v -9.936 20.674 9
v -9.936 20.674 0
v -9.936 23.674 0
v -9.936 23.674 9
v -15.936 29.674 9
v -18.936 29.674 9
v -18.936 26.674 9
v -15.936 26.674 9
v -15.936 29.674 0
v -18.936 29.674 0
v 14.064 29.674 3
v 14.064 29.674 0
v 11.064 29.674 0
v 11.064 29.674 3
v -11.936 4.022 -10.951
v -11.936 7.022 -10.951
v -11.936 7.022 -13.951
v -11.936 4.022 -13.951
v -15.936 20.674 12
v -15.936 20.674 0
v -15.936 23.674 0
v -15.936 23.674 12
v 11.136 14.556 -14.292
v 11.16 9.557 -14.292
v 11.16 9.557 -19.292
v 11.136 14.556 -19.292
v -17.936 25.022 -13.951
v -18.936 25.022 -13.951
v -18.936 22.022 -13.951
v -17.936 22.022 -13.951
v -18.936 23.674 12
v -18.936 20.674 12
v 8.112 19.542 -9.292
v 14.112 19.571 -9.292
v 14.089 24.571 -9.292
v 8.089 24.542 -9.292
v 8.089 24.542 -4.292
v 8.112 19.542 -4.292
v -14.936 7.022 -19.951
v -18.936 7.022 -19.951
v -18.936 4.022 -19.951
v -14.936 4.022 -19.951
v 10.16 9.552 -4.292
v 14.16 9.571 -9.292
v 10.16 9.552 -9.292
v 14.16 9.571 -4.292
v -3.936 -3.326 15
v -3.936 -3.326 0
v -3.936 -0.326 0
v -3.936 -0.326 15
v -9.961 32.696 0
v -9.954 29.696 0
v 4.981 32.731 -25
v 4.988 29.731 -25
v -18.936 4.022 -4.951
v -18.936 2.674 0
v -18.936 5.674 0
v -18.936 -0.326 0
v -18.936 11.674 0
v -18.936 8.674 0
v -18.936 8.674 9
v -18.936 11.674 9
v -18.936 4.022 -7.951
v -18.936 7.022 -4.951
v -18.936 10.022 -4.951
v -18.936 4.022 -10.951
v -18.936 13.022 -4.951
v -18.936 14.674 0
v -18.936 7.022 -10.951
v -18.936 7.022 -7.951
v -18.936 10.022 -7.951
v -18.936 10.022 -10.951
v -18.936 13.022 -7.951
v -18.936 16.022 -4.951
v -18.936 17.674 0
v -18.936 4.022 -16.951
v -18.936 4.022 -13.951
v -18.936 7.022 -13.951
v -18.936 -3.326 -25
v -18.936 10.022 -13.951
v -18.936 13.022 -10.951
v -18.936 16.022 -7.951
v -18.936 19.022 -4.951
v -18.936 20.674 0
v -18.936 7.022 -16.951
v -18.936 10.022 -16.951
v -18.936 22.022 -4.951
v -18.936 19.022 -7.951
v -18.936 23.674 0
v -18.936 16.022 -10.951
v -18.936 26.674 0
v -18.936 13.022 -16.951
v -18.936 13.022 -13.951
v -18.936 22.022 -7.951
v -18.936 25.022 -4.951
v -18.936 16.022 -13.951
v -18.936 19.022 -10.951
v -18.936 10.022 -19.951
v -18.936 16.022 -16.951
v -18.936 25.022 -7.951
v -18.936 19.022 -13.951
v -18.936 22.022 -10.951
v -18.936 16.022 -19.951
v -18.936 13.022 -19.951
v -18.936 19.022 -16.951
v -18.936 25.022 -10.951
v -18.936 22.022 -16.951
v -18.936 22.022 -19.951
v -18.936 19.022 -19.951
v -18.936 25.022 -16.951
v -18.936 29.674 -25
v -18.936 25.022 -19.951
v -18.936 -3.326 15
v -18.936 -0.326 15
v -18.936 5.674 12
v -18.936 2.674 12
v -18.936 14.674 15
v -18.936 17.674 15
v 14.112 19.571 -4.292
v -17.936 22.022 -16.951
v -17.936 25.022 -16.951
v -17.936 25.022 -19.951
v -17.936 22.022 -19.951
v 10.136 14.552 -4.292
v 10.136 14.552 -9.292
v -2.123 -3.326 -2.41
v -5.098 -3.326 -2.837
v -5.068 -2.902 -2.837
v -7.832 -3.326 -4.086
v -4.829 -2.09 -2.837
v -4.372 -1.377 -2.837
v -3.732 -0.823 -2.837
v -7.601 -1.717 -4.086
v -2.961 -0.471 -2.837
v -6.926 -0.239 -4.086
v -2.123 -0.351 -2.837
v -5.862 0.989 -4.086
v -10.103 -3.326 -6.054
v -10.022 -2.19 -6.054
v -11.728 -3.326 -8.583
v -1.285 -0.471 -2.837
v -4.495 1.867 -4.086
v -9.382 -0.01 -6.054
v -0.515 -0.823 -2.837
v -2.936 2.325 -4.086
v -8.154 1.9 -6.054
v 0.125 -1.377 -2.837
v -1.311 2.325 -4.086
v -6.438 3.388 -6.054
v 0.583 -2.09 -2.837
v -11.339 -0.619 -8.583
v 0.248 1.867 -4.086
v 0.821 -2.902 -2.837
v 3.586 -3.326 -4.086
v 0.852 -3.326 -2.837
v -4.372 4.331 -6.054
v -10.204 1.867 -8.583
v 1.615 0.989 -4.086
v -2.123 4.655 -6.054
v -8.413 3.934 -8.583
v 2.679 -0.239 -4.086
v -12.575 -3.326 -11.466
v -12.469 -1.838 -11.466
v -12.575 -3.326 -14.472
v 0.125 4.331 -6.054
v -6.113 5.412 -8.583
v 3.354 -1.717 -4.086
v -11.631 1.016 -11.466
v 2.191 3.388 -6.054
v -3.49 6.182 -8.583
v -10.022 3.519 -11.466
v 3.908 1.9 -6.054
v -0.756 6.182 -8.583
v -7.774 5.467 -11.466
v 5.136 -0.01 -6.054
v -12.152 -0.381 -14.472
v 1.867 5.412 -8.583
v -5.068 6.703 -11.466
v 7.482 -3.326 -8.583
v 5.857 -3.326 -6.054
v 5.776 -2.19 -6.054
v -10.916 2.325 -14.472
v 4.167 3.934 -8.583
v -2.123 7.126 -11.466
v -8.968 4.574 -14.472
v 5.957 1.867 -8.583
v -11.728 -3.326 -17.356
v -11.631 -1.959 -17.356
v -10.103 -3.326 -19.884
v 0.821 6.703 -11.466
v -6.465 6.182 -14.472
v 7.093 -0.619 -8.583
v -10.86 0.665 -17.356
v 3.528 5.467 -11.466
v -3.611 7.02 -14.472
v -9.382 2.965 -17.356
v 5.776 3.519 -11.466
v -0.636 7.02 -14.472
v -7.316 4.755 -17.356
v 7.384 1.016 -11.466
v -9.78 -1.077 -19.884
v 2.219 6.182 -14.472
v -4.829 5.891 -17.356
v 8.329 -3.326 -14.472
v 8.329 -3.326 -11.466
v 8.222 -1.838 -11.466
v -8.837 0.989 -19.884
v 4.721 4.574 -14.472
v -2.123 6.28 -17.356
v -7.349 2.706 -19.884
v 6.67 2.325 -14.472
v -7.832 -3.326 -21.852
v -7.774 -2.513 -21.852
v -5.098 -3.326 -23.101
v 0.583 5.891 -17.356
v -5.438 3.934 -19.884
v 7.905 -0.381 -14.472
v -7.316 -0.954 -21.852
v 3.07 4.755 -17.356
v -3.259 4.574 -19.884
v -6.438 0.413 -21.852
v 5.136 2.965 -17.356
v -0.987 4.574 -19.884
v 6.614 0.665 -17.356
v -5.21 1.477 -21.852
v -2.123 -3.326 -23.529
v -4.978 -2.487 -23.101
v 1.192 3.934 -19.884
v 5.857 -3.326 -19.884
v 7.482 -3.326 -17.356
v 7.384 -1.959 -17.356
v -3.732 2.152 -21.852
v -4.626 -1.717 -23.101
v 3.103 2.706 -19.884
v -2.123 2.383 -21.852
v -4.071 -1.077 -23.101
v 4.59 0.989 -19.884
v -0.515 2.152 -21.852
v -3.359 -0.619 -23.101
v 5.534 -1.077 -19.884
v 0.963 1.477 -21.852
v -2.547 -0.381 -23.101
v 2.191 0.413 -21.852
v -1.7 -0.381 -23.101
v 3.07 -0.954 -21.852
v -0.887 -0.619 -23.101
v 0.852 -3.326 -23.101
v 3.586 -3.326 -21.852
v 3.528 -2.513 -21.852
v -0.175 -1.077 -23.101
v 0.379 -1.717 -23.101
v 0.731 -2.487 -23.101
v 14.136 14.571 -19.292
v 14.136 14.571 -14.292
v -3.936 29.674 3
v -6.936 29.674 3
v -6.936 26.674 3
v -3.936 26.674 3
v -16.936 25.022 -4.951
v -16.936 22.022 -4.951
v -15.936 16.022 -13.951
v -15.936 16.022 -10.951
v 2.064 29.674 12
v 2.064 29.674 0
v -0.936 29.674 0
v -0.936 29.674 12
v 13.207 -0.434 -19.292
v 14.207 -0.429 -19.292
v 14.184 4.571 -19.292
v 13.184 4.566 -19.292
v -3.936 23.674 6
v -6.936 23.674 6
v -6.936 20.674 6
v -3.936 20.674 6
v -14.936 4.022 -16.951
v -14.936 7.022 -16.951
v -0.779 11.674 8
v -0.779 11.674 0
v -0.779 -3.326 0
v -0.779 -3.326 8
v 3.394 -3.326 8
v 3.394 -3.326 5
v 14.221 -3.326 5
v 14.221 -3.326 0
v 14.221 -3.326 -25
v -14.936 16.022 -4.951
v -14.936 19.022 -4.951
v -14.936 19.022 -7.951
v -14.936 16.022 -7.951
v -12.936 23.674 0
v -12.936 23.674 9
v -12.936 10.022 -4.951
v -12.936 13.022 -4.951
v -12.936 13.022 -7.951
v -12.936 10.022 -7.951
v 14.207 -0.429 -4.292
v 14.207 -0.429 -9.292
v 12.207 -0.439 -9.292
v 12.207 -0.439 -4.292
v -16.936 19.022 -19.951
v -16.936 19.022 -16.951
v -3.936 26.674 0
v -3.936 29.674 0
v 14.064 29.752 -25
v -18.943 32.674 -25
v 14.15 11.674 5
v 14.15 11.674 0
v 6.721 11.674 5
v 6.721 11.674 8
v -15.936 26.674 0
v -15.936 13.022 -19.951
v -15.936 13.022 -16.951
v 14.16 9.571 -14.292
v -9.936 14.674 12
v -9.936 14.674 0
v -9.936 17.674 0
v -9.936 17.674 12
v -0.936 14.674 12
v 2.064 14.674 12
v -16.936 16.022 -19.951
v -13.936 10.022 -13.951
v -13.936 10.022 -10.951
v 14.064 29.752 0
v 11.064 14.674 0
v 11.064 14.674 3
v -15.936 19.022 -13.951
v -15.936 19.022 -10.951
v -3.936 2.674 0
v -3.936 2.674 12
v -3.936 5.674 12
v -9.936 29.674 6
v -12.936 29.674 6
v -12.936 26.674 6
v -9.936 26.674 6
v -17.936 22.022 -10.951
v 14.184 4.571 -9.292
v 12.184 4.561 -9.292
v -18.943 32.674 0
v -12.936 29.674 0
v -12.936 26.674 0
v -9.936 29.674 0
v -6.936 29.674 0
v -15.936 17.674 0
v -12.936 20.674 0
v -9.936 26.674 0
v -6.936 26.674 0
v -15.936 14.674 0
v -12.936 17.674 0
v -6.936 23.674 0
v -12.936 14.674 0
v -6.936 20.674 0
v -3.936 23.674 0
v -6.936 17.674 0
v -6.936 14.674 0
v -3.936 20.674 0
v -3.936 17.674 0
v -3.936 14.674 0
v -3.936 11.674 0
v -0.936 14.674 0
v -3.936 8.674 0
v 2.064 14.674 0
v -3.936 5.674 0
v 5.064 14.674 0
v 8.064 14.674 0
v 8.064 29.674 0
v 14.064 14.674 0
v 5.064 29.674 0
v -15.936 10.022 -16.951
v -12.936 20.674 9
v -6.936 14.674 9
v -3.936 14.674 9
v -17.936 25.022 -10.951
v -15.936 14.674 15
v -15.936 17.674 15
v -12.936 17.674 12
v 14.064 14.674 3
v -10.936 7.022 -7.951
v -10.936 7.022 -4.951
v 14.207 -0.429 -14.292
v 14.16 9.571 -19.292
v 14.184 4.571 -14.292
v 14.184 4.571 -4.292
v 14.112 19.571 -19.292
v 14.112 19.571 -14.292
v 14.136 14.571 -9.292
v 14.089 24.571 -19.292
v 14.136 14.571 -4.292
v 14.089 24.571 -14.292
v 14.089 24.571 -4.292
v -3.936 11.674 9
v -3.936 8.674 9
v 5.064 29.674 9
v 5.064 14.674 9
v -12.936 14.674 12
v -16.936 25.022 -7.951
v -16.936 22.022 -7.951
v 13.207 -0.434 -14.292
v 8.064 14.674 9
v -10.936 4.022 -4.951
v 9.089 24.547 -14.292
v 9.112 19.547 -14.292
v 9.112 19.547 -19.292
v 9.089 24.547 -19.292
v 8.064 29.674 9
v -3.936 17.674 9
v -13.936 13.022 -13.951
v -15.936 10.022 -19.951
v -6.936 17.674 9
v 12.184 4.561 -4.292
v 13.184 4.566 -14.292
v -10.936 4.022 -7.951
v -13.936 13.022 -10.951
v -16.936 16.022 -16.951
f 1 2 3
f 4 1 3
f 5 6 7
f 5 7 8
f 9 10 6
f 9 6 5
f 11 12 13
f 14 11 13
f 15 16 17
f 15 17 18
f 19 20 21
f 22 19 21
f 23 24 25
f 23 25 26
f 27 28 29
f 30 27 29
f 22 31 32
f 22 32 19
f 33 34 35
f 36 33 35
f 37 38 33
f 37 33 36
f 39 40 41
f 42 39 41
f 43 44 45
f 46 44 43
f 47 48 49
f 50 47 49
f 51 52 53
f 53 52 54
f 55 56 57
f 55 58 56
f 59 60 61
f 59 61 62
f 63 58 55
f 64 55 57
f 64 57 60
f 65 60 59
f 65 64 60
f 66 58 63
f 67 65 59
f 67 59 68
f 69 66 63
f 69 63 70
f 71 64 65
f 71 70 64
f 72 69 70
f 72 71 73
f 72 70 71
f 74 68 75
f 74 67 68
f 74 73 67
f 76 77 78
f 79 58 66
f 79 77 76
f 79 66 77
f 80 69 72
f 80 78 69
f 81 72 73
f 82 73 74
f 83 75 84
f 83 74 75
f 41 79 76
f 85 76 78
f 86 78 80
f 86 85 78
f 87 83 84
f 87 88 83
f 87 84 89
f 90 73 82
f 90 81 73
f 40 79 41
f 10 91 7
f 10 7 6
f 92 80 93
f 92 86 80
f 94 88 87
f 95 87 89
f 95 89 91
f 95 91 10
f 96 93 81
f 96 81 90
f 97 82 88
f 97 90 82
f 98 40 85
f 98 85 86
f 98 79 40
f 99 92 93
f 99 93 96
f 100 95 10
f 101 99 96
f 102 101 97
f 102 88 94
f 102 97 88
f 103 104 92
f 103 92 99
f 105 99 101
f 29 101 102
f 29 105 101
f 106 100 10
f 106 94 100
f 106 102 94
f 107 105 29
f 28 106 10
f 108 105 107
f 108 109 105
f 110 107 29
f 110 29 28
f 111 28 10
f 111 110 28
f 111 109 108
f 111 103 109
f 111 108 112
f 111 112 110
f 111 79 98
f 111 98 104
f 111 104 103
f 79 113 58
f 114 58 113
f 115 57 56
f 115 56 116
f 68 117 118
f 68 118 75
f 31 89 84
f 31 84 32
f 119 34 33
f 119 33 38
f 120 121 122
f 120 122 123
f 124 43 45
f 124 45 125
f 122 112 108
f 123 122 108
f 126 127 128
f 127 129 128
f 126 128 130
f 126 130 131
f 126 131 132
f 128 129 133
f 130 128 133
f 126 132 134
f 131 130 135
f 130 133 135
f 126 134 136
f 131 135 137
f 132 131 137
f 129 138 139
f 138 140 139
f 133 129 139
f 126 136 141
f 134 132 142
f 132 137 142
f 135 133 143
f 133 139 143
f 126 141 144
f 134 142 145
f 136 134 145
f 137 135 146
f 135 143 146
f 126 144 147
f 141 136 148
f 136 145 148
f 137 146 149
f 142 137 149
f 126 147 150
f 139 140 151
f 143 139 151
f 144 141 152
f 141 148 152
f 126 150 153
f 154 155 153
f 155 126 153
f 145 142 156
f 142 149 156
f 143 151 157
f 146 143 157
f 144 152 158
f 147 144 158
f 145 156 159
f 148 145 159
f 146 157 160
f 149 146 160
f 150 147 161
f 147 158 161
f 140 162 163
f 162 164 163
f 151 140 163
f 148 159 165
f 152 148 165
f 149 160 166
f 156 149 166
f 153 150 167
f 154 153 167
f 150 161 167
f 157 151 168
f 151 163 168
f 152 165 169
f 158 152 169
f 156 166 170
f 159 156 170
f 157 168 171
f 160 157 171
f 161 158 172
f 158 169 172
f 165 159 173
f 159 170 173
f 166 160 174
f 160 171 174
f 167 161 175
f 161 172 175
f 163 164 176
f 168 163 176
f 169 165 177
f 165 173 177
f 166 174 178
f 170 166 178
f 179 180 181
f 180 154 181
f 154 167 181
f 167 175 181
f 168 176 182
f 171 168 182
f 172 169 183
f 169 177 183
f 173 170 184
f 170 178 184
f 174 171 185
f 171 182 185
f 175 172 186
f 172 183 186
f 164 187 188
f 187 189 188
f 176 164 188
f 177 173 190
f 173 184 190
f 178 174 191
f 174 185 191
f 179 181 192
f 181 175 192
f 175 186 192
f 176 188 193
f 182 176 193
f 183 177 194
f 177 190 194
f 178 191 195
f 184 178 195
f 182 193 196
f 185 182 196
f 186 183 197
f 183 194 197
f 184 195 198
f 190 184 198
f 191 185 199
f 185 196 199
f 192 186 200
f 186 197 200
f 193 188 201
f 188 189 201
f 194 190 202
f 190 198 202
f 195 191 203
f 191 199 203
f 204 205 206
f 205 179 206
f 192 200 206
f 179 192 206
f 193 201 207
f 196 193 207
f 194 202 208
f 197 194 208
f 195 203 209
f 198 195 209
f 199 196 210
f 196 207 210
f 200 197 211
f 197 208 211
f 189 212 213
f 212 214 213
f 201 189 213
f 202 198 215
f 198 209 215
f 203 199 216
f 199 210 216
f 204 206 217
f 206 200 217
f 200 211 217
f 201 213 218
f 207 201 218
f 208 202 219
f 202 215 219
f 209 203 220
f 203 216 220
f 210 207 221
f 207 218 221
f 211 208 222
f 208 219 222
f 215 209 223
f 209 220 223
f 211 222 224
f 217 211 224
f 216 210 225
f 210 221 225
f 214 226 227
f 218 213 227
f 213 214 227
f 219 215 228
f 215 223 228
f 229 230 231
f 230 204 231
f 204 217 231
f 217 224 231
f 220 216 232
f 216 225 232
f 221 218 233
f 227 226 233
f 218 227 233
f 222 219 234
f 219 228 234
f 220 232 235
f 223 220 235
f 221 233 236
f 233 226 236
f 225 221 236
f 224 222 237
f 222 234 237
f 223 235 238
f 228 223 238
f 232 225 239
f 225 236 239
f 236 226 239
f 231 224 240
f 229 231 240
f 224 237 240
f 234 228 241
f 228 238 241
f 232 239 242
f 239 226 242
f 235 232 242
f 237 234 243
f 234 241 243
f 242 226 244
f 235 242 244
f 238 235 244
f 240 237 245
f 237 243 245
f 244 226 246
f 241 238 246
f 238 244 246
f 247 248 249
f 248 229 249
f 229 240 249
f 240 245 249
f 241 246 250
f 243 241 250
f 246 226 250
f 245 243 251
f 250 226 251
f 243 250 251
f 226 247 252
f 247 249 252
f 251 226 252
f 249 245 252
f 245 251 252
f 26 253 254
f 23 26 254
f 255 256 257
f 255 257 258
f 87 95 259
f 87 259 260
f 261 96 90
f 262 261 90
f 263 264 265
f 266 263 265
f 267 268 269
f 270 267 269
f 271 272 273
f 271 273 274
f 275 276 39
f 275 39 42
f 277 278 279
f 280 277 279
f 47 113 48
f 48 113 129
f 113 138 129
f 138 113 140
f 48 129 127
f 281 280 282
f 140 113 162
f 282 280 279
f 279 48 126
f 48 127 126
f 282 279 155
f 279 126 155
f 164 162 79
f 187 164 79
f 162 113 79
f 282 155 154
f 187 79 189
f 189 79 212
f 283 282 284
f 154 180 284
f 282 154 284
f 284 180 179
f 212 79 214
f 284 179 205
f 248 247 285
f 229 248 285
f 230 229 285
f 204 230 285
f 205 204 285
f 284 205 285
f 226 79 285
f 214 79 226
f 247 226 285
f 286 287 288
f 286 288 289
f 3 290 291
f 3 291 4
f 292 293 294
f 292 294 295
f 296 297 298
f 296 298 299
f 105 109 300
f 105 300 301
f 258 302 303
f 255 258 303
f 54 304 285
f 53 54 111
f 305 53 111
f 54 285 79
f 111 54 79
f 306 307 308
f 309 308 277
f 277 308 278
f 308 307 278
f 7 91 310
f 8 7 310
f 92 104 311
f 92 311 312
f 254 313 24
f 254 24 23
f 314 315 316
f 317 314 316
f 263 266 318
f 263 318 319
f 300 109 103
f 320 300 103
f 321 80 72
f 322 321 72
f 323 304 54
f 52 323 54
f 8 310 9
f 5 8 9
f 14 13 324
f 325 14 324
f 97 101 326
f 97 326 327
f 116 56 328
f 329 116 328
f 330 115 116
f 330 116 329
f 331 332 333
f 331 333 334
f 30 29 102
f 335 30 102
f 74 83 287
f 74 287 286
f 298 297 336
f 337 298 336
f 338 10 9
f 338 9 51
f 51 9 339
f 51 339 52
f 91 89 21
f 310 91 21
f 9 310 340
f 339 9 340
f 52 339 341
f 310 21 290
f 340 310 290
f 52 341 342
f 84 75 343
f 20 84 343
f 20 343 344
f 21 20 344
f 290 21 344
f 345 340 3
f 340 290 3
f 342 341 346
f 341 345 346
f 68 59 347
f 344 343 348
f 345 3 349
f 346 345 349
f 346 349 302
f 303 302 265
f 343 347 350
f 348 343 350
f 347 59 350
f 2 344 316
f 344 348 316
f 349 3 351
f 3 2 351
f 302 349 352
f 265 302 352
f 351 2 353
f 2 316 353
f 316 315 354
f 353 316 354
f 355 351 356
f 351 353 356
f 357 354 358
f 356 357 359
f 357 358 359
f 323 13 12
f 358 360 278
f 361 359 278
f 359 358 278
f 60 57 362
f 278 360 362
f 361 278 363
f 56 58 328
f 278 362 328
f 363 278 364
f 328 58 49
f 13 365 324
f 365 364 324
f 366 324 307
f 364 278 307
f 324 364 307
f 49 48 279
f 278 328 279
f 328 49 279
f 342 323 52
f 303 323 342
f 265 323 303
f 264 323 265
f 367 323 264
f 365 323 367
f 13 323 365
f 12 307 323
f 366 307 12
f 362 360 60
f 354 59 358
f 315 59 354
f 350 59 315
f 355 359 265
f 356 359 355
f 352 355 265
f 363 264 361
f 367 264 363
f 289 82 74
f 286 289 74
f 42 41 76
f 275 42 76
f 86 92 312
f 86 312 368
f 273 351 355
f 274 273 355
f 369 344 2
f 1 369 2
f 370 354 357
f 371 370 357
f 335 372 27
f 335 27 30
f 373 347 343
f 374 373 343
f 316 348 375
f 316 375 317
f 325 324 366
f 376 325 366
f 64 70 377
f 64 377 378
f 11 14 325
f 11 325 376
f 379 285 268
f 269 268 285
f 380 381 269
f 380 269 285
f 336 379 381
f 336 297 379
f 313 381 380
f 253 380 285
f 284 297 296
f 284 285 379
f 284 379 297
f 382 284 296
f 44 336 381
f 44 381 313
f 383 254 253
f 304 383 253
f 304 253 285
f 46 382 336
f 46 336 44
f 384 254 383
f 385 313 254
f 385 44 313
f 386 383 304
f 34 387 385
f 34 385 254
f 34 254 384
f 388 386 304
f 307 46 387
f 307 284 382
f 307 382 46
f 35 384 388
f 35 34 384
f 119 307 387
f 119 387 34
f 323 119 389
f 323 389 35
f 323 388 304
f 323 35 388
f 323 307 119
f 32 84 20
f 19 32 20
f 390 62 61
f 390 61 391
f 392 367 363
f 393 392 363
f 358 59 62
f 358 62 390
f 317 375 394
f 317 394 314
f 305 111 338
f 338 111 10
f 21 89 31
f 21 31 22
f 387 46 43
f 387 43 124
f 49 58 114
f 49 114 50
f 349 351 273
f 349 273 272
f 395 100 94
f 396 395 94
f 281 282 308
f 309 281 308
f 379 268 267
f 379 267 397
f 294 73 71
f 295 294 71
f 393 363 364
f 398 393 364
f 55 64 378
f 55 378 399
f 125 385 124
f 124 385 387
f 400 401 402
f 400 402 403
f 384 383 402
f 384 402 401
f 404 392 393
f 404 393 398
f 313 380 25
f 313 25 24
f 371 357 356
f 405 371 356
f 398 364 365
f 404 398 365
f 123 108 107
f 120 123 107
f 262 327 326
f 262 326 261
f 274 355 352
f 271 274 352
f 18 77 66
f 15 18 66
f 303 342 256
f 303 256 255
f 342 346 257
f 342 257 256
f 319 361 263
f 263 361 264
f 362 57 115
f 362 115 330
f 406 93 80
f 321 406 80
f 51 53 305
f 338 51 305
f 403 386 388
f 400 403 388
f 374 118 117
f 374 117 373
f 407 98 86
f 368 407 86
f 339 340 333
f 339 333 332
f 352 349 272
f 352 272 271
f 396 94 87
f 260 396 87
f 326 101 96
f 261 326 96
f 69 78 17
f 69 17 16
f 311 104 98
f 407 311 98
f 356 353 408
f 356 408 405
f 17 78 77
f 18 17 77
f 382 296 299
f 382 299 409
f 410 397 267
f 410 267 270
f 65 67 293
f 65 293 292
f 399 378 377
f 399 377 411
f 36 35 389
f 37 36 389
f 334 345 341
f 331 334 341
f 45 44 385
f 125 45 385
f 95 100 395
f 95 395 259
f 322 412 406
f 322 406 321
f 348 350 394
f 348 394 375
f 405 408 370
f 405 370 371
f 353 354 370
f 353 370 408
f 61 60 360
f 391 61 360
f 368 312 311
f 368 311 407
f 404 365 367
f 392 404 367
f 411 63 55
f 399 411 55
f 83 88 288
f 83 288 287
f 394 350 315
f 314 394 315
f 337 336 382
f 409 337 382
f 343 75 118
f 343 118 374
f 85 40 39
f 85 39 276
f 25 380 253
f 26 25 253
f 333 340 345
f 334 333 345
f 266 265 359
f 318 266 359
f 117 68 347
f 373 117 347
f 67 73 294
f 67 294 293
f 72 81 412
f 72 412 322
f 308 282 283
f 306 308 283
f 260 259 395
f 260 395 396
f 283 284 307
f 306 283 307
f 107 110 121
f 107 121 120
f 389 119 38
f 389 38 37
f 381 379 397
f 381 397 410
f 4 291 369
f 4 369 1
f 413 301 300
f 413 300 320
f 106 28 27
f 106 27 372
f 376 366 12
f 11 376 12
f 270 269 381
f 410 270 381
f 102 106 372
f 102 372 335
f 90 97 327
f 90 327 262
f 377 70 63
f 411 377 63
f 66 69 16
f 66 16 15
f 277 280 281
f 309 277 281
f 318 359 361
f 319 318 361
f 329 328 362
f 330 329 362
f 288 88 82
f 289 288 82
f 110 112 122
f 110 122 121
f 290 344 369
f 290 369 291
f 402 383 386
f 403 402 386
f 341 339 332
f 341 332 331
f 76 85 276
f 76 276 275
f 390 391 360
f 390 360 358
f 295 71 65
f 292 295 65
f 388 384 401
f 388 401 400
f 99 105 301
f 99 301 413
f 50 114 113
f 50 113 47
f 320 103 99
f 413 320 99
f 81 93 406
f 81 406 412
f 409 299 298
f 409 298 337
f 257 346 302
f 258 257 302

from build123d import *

# Parameters (mm, degrees)
F1_DEPTH  = 5
F0_W      = 15
F0_H      = 3
F2_DEPTH  = 15
F0_W_2    = 3
F3_DEPTH  = 3
F4_DEPTH  = 12
F6_DEPTH  = 25
F10_W     = 5
F10_H     = 5
F11_DEPTH = 2
F12_DEPTH = 12
F13_DEPTH = 9
F14_DEPTH = 6
F15_DEPTH = 9
F16_DEPTH = 9
F17_DEPTH = 15
F18_DEPTH = 12
F19_DEPTH = 6
F20_DEPTH = 9
F21_DEPTH = 12
F22_DEPTH = 9
F23_DEPTH = 3
F24_DEPTH = 4
F25_DEPTH = 6
F26_DEPTH = 1
F27_DEPTH = 3
F28_DEPTH = 5
F9_W      = 3
F9_H      = 3
F29_DEPTH = 2
F30_DEPTH = 4
F31_DEPTH = 6
F32_DEPTH = 8
F33_DEPTH = 1
F34_DEPTH = 3
F35_DEPTH = 5
F36_DEPTH = 7
F37_DEPTH = 1
F38_DEPTH = 2
F39_DEPTH = 3
F40_DEPTH = 4
F42_DEPTH = 3
F44_DEPTH = 3


with BuildPart() as f1:
    # F0 (on Top) → F1 (new body)
    with BuildSketch(Plane.XY):
        Polygon((14.2212225916, -3.3255452978), (14.1498658388, 11.6744547022), (-0.7787774084, 11.6744547022), (-0.7787774084, -3.3255452978), align=None)
    extrude(amount=F1_DEPTH)



with BuildPart() as f2:
    # F0 (on Top) → F2 (new body)
    with BuildSketch(Plane.XY):
        with Locations((-11.4361313693, -1.8255452978)):
            Rectangle(F0_W, F0_H)
    extrude(amount=F2_DEPTH)


with BuildPart() as f3:
    # F0 (on Top) → F3 (new body)
    with BuildSketch(Plane.XY):
        with Locations((-5.4361313693, 28.1744547022)):
            Rectangle(F0_W_2, F0_H)
    extrude(amount=F3_DEPTH)


with BuildPart() as f4:
    # F0 (on Top) → F4 (new body)
    with BuildSketch(Plane.XY):
        Polygon((2.0638686307, 29.6744547022), (-0.9361313693, 29.6744547022), (-0.9361313693, 14.7520447022), (-0.9361313693, 14.6744547022), (2.0638686307, 14.6744547022), (2.0638686307, 14.7520447022), align=None)
    extrude(amount=F4_DEPTH)


with BuildPart() as f1_1:
    add(f1.part)

    add(f2.part)  # F6 merges F2

    add(f3.part)  # F6 merges F3

    add(f4.part)  # F6 merges F4
    # F5 (on Top) → F6 (join)
    with BuildSketch(Plane.XY):
        Polygon((-18.9361313693, -3.3255452978), (14.2212225916, -3.3255452978), (14.0638686307, 29.7520447022), (-18.9361313693, 29.6744547022), align=None)
    extrude(amount=-F6_DEPTH)

    # F7 (on face) → F8 (revolve, cut)
    with BuildSketch(Plane.XZ.offset(3.3255452978)):
        with BuildLine():
            Line((-2.1231973078, -23.52852803), (-2.1231973078, -2.4096941548))
            ThreePointArc((-2.1231973078, -2.4096941548), (-12.6826142454, -12.9691110924), (-2.1231973078, -23.52852803))
        make_face()
    revolve(axis=Axis((-2.1231973078, -3.3255452978, -12.9691110924), (0, 0, -1)), mode=Mode.SUBTRACT)

    # F10 (on face) → F11 (cut)
    with BuildSketch(Plane(origin=(14.2050811207, 0.0675752308, 0), x_dir=(-0.004757063, 0.9999886851, 0), z_dir=(0.9999886851, 0.004757063, 0))):
        with Locations((2.0033325977, -6.7919711024)):
            Rectangle(F10_W, F10_H)
    extrude(amount=-F11_DEPTH, mode=Mode.SUBTRACT)

    # F0 (on Top) → F12 (join)
    with BuildSketch(Plane.XY):
        with Locations((-11.4361313693, 4.1744547022)):
            Rectangle(F0_W, F0_H)
    extrude(amount=F12_DEPTH)

    # F0 (on Top) → F13 (join)
    with BuildSketch(Plane.XY):
        with Locations((-11.4361313693, 10.1744547022)):
            Rectangle(F0_W, F0_H)
    extrude(amount=F13_DEPTH)

    # F0 (on Top) → F14 (join)
    with BuildSketch(Plane.XY):
        with Locations((-11.4361313693, 28.1744547022)):
            Rectangle(F0_W_2, F0_H)
    extrude(amount=F14_DEPTH)

    # F0 (on Top) → F15 (join)
    with BuildSketch(Plane.XY):
        with Locations((-17.4361313693, 28.1744547022)):
            Rectangle(F0_W_2, F0_H)
    extrude(amount=F15_DEPTH)

    # F0 (on Top) → F16 (join)
    with BuildSketch(Plane.XY):
        with Locations((-11.4361313693, 22.1744547022)):
            Rectangle(F0_W_2, F0_H)
    extrude(amount=F16_DEPTH)

    # F0 (on Top) → F17 (join)
    with BuildSketch(Plane.XY):
        with Locations((-17.4361313693, 16.1744547022)):
            Rectangle(F0_W_2, F0_H)
    extrude(amount=F17_DEPTH)

    # F0 (on Top) → F18 (join)
    with BuildSketch(Plane.XY):
        with Locations((-17.4361313693, 22.1744547022)):
            Rectangle(F0_W_2, F0_H)
    extrude(amount=F18_DEPTH)

    # F0 (on Top) → F19 (join)
    with BuildSketch(Plane.XY):
        with Locations((-5.4361313693, 22.1744547022)):
            Rectangle(F0_W_2, F0_H)
    extrude(amount=F19_DEPTH)

    # F0 (on Top) → F20 (join)
    with BuildSketch(Plane.XY):
        with Locations((-5.4361313693, 16.1744547022)):
            Rectangle(F0_W_2, F0_H)
    extrude(amount=F20_DEPTH)

    # F0 (on Top) → F21 (join)
    with BuildSketch(Plane.XY):
        with Locations((-11.4361313693, 16.1744547022)):
            Rectangle(F0_W_2, F0_H)
    extrude(amount=F21_DEPTH)

    # F0 (on Top) → F22 (join)
    with BuildSketch(Plane.XY):
        Polygon((8.0638686307, 29.6744547022), (5.0638686307, 29.6744547022), (5.0638686307, 14.7520447022), (5.0638686307, 14.6744547022), (8.0638686307, 14.6744547022), (8.0638686307, 14.7520447022), align=None)
    extrude(amount=F22_DEPTH)

    # F0 (on Top) → F23 (join)
    with BuildSketch(Plane.XY):
        Polygon((14.0638686307, 29.6744547022), (11.0638686307, 29.6744547022), (11.0638686307, 14.7520447022), (11.0638686307, 14.6744547022), (14.0638686307, 14.6744547022), (14.0638686307, 14.7520447022), align=None)
    extrude(amount=F23_DEPTH)

    # F10 (on face) → F24 (cut)
    with BuildSketch(Plane(origin=(14.2050811207, 0.0675752308, 0), x_dir=(-0.004757063, 0.9999886851, 0), z_dir=(0.9999886851, 0.004757063, 0))):
        with Locations((12.0033325977, -6.7919711024)):
            Rectangle(F10_W, F10_H)
    extrude(amount=-F24_DEPTH, mode=Mode.SUBTRACT)

    # F10 (on face) → F25 (cut)
    with BuildSketch(Plane(origin=(14.2050811207, 0.0675752308, 0), x_dir=(-0.004757063, 0.9999886851, 0), z_dir=(0.9999886851, 0.004757063, 0))):
        with Locations((22.0033325977, -6.7919711024)):
            Rectangle(F10_W, F10_H)
    extrude(amount=-F25_DEPTH, mode=Mode.SUBTRACT)

    # F10 (on face) → F26 (cut)
    with BuildSketch(Plane(origin=(14.2050811207, 0.0675752308, 0), x_dir=(-0.004757063, 0.9999886851, 0), z_dir=(0.9999886851, 0.004757063, 0))):
        with Locations((2.0033325977, -16.7919711024)):
            Rectangle(F10_W, F10_H)
    extrude(amount=-F26_DEPTH, mode=Mode.SUBTRACT)

    # F10 (on face) → F27 (cut)
    with BuildSketch(Plane(origin=(14.2050811207, 0.0675752308, 0), x_dir=(-0.004757063, 0.9999886851, 0), z_dir=(0.9999886851, 0.004757063, 0))):
        with Locations((12.0033325977, -16.7919711024)):
            Rectangle(F10_W, F10_H)
    extrude(amount=-F27_DEPTH, mode=Mode.SUBTRACT)

    # F10 (on face) → F28 (cut)
    with BuildSketch(Plane(origin=(14.2050811207, 0.0675752308, 0), x_dir=(-0.004757063, 0.9999886851, 0), z_dir=(0.9999886851, 0.004757063, 0))):
        with Locations((22.0033325977, -16.7919711024)):
            Rectangle(F10_W, F10_H)
    extrude(amount=-F28_DEPTH, mode=Mode.SUBTRACT)

    # F9 (on face) → F29 (cut)
    with BuildSketch(Plane(origin=(-18.9361313693, 0, 0), x_dir=(0, -1, 0), z_dir=(-1, 0, 0))):
        with Locations((-23.521638004, -6.4509857927)):
            Rectangle(F9_W, F9_H)
    extrude(amount=-F29_DEPTH, mode=Mode.SUBTRACT)

    # F9 (on face) → F30 (cut)
    with BuildSketch(Plane(origin=(-18.9361313693, 0, 0), x_dir=(0, -1, 0), z_dir=(-1, 0, 0))):
        with Locations((-17.521638004, -6.4509857927)):
            Rectangle(F9_W, F9_H)
    extrude(amount=-F30_DEPTH, mode=Mode.SUBTRACT)

    # F9 (on face) → F31 (cut)
    with BuildSketch(Plane(origin=(-18.9361313693, 0, 0), x_dir=(0, -1, 0), z_dir=(-1, 0, 0))):
        with Locations((-11.521638004, -6.4509857927)):
            Rectangle(F9_W, F9_H)
    extrude(amount=-F31_DEPTH, mode=Mode.SUBTRACT)

    # F9 (on face) → F32 (cut)
    with BuildSketch(Plane(origin=(-18.9361313693, 0, 0), x_dir=(0, -1, 0), z_dir=(-1, 0, 0))):
        with Locations((-5.521638004, -6.4509857927)):
            Rectangle(F9_W, F9_H)
    extrude(amount=-F32_DEPTH, mode=Mode.SUBTRACT)

    # F9 (on face) → F33 (cut)
    with BuildSketch(Plane(origin=(-18.9361313693, 0, 0), x_dir=(0, -1, 0), z_dir=(-1, 0, 0))):
        with Locations((-23.521638004, -12.4509857927)):
            Rectangle(F9_W, F9_H)
    extrude(amount=-F33_DEPTH, mode=Mode.SUBTRACT)

    # F9 (on face) → F34 (cut)
    with BuildSketch(Plane(origin=(-18.9361313693, 0, 0), x_dir=(0, -1, 0), z_dir=(-1, 0, 0))):
        with Locations((-17.521638004, -12.4509857927)):
            Rectangle(F9_W, F9_H)
    extrude(amount=-F34_DEPTH, mode=Mode.SUBTRACT)

    # F9 (on face) → F35 (cut)
    with BuildSketch(Plane(origin=(-18.9361313693, 0, 0), x_dir=(0, -1, 0), z_dir=(-1, 0, 0))):
        with Locations((-11.521638004, -12.4509857927)):
            Rectangle(F9_W, F9_H)
    extrude(amount=-F35_DEPTH, mode=Mode.SUBTRACT)

    # F9 (on face) → F36 (cut)
    with BuildSketch(Plane(origin=(-18.9361313693, 0, 0), x_dir=(0, -1, 0), z_dir=(-1, 0, 0))):
        with Locations((-5.521638004, -12.4509857927)):
            Rectangle(F9_W, F9_H)
    extrude(amount=-F36_DEPTH, mode=Mode.SUBTRACT)

    # F9 (on face) → F37 (cut)
    with BuildSketch(Plane(origin=(-18.9361313693, 0, 0), x_dir=(0, -1, 0), z_dir=(-1, 0, 0))):
        with Locations((-23.521638004, -18.4509857927)):
            Rectangle(F9_W, F9_H)
    extrude(amount=-F37_DEPTH, mode=Mode.SUBTRACT)

    # F9 (on face) → F38 (cut)
    with BuildSketch(Plane(origin=(-18.9361313693, 0, 0), x_dir=(0, -1, 0), z_dir=(-1, 0, 0))):
        with Locations((-17.521638004, -18.4509857927)):
            Rectangle(F9_W, F9_H)
    extrude(amount=-F38_DEPTH, mode=Mode.SUBTRACT)

    # F9 (on face) → F39 (cut)
    with BuildSketch(Plane(origin=(-18.9361313693, 0, 0), x_dir=(0, -1, 0), z_dir=(-1, 0, 0))):
        with Locations((-11.521638004, -18.4509857927)):
            Rectangle(F9_W, F9_H)
    extrude(amount=-F39_DEPTH, mode=Mode.SUBTRACT)

    # F9 (on face) → F40 (cut)
    with BuildSketch(Plane(origin=(-18.9361313693, 0, 0), x_dir=(0, -1, 0), z_dir=(-1, 0, 0))):
        with Locations((-5.521638004, -18.4509857927)):
            Rectangle(F9_W, F9_H)
    extrude(amount=-F40_DEPTH, mode=Mode.SUBTRACT)

    # F41 (on face) → F42 (join)
    with BuildSketch(Plane.XY.offset(5)):
        Polygon((-0.7787774084, -3.3255452978), (3.3940772992, -3.3255452978), (6.7212225916, 11.6744547022), (-0.7787774084, 11.6744547022), align=None)
    extrude(amount=F42_DEPTH)

    # F43 (on face) → F44 (join)
    with BuildSketch(Plane(origin=(-0.069875234, 29.7188132724, 0), x_dir=(-0.9999972359, -0.0023512056, 0), z_dir=(-0.0023512056, 0.9999972359, 0))):
        Polygon((18.8663082835, 0), (9.8840193823, 0), (-5.0577260554, -25), (18.8663082835, -25), align=None)
    extrude(amount=F44_DEPTH)


solid = f1_1.part
